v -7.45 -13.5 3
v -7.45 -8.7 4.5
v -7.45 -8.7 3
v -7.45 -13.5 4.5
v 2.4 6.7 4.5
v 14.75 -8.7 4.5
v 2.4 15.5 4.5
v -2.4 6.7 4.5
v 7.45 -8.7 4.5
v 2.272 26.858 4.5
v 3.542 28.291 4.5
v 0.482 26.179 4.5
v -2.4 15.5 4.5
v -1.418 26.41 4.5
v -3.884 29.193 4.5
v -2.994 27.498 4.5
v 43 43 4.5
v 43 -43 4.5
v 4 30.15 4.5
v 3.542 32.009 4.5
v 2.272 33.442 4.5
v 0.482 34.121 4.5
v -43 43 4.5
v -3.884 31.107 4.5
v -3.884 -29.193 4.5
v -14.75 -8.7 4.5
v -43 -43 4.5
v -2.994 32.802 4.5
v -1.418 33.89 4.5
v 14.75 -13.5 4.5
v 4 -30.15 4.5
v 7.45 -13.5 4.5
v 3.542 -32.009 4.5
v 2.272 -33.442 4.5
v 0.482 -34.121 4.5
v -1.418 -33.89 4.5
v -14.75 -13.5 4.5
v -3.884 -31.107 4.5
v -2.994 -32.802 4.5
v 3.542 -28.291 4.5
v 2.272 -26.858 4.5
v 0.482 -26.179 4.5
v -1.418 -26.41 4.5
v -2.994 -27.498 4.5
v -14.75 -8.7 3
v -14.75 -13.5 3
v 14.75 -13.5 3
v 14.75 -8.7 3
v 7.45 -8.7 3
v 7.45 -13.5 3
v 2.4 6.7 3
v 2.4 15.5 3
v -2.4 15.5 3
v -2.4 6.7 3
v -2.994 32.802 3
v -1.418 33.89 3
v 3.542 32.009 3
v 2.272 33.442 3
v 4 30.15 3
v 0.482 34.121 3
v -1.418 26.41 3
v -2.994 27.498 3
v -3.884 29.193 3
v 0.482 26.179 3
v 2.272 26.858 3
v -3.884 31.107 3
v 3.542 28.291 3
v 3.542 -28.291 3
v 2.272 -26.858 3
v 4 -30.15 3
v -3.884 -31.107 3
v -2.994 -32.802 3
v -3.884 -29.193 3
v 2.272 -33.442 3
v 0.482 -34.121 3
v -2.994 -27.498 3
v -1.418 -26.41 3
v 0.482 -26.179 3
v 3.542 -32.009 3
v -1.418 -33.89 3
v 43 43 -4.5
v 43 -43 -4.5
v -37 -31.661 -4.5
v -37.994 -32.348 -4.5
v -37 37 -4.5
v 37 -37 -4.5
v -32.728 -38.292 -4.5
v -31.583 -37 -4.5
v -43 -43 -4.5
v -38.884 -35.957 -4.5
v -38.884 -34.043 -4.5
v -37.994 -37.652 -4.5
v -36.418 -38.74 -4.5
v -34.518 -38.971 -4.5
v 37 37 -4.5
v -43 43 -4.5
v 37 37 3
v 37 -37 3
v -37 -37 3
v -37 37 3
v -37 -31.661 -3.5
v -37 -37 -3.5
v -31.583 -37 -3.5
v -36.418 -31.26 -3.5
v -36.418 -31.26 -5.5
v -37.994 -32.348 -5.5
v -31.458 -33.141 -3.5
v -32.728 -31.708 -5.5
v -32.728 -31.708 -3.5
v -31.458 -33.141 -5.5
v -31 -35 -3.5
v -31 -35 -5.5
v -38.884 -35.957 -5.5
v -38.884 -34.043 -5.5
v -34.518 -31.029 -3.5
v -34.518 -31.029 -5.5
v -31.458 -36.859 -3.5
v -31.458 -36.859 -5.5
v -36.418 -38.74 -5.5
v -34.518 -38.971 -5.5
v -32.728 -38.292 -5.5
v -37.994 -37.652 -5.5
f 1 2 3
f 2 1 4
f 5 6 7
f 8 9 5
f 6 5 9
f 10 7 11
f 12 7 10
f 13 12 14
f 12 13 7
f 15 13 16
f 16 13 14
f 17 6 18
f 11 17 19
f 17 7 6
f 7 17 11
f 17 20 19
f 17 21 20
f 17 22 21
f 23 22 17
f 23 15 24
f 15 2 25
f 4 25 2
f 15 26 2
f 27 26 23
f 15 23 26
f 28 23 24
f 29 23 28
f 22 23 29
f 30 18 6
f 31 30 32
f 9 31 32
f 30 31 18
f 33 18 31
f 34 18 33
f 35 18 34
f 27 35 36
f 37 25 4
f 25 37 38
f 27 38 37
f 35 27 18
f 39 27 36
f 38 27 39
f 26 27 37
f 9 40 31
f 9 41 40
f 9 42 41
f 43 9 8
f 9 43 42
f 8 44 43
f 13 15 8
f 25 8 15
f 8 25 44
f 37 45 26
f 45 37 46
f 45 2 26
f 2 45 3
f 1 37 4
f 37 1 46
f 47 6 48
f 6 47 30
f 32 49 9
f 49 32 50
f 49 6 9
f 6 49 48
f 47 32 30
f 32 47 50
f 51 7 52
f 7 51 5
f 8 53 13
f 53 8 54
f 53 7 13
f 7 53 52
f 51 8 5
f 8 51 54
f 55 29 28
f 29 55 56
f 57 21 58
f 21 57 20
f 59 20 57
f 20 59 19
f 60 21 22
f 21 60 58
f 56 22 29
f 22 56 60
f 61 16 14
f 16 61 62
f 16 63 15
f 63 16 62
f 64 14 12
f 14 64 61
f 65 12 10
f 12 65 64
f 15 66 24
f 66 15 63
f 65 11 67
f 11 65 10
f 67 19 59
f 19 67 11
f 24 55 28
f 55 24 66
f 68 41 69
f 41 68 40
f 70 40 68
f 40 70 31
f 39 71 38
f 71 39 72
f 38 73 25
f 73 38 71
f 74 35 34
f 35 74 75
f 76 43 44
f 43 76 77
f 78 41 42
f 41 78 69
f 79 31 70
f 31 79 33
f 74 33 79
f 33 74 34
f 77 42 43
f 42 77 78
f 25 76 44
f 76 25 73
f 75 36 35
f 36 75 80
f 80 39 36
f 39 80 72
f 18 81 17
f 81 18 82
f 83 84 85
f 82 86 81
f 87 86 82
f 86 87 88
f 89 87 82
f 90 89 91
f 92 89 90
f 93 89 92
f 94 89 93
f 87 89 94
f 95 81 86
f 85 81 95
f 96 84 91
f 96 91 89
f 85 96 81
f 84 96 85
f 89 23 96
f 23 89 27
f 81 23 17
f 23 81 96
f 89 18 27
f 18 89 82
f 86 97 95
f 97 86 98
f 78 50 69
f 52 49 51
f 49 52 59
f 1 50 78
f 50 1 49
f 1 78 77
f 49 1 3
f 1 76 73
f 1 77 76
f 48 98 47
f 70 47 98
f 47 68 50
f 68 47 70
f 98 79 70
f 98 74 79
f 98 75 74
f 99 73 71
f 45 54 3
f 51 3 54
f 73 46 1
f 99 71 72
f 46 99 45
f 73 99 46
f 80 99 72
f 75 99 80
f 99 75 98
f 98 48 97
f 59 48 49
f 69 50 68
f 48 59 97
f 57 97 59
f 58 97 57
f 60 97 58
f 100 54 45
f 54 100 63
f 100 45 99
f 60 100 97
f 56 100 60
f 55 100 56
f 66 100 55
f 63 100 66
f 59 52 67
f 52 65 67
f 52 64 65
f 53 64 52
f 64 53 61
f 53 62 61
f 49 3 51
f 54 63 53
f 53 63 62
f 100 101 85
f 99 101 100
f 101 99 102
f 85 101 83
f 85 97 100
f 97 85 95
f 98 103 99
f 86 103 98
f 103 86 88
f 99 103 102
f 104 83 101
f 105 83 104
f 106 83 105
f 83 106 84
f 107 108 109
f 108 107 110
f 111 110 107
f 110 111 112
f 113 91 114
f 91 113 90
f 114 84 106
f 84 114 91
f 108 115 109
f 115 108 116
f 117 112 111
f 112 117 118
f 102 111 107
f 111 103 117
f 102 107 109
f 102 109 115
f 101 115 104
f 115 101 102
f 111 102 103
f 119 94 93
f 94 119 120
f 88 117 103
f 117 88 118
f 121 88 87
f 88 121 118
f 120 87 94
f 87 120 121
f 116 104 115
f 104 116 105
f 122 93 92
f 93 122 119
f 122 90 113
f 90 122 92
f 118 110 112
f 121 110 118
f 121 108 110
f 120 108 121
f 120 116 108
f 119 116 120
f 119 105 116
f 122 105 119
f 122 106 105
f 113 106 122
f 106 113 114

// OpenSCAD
// Parameters
socket_style_old = 1; //[0:1:1]
switched = 0; //[0:1:1]
include_earth_terminal_position = 1; //[0:1:1]
include_panel_cutout_reference = 0; //[0:1:1]
plate_width = 86; //[60:172:1]
plate_height = 86; //[60:172:1]
plate_thickness = 9; //[5:18:1]
front_lip_thickness = 2; //[1:5:1]
wall_thickness = 2.5; //[1.5:6:0.5]
rear_cavity_depth = 6.5; //[3:13:0.5]
edge_margin = 6; //[3:12:1]
overlap = 1; //[0.5:2:0.5]
pin_hole_depth = 12; //[8:24:1]
pin_hole_clearance = 0.3; //[0:1:0.1]
live_neutral_pitch_x = 22.2; //[18:30:0.1]
live_neutral_y = -11.1; //[-16:-6:0.1]
earth_y = 11.1; //[6:16:0.1]
ln_hole_width = 7; //[5:10:0.1]
ln_hole_height = 4.5; //[3:7:0.1]
earth_hole_width = 4.5; //[3:7:0.1]
earth_hole_height = 8.5; //[6:12:0.1]
screw_pitch_y = 60.3; //[45:90:0.1]
screw_clear_diameter = 3.8; //[3:5:0.1]
counterbore_diameter = 8; //[6:12:0.1]
counterbore_depth = 2.5; //[1:6:0.1]
earth_ref_boss_diameter = 8; //[4:16:0.5]
earth_ref_boss_height = 2; //[1:6:0.5]
earth_ref_inset = 8; //[4:20:0.5]

// Mains Socket - complete geometry
module mains_socket() {
  color("White") {
    difference() {
      // Faceplate body
      cube([plate_width, plate_height, plate_thickness], center=true);
      
      // Rear hollow cavity
      translate([0, 0, -plate_thickness/2 + rear_cavity_depth/2 + overlap/2])
        cube([plate_width - 2*edge_margin, plate_height - 2*edge_margin, rear_cavity_depth + overlap], center=true);
      
      // Pin apertures
      union() {
        translate([-live_neutral_pitch_x/2, live_neutral_y, plate_thickness/2 - (pin_hole_depth + overlap)/2])
          cube([ln_hole_width + pin_hole_clearance, ln_hole_height + pin_hole_clearance, pin_hole_depth + overlap], center=true);
        translate([live_neutral_pitch_x/2, live_neutral_y, plate_thickness/2 - (pin_hole_depth + overlap)/2])
          cube([ln_hole_width + pin_hole_clearance, ln_hole_height + pin_hole_clearance, pin_hole_depth + overlap], center=true);
        translate([0, earth_y, plate_thickness/2 - (pin_hole_depth + overlap)/2])
          cube([earth_hole_width + pin_hole_clearance, earth_hole_height + pin_hole_clearance, pin_hole_depth + overlap], center=true);
      }
      
      // Mounting screw holes
      union() {
        translate([0, screw_pitch_y/2, 0])
          cylinder(h=plate_thickness + 2*overlap, r=screw_clear_diameter/2, center=true);
        translate([0, -screw_pitch_y/2, 0])
          cylinder(h=plate_thickness + 2*overlap, r=screw_clear_diameter/2, center=true);
      }
      
      // Counterbores
      union() {
        translate([0, screw_pitch_y/2, plate_thickness/2 - (counterbore_depth + overlap)/2])
          cylinder(h=counterbore_depth + overlap, r=counterbore_diameter/2, center=true);
        translate([0, -screw_pitch_y/2, plate_thickness/2 - (counterbore_depth + overlap)/2])
          cylinder(h=counterbore_depth + overlap, r=counterbore_diameter/2, center=true);
      }
    }
  }
}

// Mains Socket Earth Position - complete geometry
module mains_socket_earth_position() {
  color("Silver") {
    scale([include_earth_terminal_position, include_earth_terminal_position, include_earth_terminal_position]) {
      translate([-plate_width/2 + earth_ref_inset, -plate_height/2 + earth_ref_inset, -plate_thickness/2 - earth_ref_boss_height/2 + overlap])
        cylinder(h=earth_ref_boss_height, r=earth_ref_boss_diameter/2, center=true);
    }
  }
}

// Mains Socket Holes - complete geometry
module mains_socket_holes() {
  // This module is integrated into the mains_socket() as part of the difference operation
}

// Assembly
module assembly() {
  mains_socket();
  mains_socket_earth_position();
}

assembly();
